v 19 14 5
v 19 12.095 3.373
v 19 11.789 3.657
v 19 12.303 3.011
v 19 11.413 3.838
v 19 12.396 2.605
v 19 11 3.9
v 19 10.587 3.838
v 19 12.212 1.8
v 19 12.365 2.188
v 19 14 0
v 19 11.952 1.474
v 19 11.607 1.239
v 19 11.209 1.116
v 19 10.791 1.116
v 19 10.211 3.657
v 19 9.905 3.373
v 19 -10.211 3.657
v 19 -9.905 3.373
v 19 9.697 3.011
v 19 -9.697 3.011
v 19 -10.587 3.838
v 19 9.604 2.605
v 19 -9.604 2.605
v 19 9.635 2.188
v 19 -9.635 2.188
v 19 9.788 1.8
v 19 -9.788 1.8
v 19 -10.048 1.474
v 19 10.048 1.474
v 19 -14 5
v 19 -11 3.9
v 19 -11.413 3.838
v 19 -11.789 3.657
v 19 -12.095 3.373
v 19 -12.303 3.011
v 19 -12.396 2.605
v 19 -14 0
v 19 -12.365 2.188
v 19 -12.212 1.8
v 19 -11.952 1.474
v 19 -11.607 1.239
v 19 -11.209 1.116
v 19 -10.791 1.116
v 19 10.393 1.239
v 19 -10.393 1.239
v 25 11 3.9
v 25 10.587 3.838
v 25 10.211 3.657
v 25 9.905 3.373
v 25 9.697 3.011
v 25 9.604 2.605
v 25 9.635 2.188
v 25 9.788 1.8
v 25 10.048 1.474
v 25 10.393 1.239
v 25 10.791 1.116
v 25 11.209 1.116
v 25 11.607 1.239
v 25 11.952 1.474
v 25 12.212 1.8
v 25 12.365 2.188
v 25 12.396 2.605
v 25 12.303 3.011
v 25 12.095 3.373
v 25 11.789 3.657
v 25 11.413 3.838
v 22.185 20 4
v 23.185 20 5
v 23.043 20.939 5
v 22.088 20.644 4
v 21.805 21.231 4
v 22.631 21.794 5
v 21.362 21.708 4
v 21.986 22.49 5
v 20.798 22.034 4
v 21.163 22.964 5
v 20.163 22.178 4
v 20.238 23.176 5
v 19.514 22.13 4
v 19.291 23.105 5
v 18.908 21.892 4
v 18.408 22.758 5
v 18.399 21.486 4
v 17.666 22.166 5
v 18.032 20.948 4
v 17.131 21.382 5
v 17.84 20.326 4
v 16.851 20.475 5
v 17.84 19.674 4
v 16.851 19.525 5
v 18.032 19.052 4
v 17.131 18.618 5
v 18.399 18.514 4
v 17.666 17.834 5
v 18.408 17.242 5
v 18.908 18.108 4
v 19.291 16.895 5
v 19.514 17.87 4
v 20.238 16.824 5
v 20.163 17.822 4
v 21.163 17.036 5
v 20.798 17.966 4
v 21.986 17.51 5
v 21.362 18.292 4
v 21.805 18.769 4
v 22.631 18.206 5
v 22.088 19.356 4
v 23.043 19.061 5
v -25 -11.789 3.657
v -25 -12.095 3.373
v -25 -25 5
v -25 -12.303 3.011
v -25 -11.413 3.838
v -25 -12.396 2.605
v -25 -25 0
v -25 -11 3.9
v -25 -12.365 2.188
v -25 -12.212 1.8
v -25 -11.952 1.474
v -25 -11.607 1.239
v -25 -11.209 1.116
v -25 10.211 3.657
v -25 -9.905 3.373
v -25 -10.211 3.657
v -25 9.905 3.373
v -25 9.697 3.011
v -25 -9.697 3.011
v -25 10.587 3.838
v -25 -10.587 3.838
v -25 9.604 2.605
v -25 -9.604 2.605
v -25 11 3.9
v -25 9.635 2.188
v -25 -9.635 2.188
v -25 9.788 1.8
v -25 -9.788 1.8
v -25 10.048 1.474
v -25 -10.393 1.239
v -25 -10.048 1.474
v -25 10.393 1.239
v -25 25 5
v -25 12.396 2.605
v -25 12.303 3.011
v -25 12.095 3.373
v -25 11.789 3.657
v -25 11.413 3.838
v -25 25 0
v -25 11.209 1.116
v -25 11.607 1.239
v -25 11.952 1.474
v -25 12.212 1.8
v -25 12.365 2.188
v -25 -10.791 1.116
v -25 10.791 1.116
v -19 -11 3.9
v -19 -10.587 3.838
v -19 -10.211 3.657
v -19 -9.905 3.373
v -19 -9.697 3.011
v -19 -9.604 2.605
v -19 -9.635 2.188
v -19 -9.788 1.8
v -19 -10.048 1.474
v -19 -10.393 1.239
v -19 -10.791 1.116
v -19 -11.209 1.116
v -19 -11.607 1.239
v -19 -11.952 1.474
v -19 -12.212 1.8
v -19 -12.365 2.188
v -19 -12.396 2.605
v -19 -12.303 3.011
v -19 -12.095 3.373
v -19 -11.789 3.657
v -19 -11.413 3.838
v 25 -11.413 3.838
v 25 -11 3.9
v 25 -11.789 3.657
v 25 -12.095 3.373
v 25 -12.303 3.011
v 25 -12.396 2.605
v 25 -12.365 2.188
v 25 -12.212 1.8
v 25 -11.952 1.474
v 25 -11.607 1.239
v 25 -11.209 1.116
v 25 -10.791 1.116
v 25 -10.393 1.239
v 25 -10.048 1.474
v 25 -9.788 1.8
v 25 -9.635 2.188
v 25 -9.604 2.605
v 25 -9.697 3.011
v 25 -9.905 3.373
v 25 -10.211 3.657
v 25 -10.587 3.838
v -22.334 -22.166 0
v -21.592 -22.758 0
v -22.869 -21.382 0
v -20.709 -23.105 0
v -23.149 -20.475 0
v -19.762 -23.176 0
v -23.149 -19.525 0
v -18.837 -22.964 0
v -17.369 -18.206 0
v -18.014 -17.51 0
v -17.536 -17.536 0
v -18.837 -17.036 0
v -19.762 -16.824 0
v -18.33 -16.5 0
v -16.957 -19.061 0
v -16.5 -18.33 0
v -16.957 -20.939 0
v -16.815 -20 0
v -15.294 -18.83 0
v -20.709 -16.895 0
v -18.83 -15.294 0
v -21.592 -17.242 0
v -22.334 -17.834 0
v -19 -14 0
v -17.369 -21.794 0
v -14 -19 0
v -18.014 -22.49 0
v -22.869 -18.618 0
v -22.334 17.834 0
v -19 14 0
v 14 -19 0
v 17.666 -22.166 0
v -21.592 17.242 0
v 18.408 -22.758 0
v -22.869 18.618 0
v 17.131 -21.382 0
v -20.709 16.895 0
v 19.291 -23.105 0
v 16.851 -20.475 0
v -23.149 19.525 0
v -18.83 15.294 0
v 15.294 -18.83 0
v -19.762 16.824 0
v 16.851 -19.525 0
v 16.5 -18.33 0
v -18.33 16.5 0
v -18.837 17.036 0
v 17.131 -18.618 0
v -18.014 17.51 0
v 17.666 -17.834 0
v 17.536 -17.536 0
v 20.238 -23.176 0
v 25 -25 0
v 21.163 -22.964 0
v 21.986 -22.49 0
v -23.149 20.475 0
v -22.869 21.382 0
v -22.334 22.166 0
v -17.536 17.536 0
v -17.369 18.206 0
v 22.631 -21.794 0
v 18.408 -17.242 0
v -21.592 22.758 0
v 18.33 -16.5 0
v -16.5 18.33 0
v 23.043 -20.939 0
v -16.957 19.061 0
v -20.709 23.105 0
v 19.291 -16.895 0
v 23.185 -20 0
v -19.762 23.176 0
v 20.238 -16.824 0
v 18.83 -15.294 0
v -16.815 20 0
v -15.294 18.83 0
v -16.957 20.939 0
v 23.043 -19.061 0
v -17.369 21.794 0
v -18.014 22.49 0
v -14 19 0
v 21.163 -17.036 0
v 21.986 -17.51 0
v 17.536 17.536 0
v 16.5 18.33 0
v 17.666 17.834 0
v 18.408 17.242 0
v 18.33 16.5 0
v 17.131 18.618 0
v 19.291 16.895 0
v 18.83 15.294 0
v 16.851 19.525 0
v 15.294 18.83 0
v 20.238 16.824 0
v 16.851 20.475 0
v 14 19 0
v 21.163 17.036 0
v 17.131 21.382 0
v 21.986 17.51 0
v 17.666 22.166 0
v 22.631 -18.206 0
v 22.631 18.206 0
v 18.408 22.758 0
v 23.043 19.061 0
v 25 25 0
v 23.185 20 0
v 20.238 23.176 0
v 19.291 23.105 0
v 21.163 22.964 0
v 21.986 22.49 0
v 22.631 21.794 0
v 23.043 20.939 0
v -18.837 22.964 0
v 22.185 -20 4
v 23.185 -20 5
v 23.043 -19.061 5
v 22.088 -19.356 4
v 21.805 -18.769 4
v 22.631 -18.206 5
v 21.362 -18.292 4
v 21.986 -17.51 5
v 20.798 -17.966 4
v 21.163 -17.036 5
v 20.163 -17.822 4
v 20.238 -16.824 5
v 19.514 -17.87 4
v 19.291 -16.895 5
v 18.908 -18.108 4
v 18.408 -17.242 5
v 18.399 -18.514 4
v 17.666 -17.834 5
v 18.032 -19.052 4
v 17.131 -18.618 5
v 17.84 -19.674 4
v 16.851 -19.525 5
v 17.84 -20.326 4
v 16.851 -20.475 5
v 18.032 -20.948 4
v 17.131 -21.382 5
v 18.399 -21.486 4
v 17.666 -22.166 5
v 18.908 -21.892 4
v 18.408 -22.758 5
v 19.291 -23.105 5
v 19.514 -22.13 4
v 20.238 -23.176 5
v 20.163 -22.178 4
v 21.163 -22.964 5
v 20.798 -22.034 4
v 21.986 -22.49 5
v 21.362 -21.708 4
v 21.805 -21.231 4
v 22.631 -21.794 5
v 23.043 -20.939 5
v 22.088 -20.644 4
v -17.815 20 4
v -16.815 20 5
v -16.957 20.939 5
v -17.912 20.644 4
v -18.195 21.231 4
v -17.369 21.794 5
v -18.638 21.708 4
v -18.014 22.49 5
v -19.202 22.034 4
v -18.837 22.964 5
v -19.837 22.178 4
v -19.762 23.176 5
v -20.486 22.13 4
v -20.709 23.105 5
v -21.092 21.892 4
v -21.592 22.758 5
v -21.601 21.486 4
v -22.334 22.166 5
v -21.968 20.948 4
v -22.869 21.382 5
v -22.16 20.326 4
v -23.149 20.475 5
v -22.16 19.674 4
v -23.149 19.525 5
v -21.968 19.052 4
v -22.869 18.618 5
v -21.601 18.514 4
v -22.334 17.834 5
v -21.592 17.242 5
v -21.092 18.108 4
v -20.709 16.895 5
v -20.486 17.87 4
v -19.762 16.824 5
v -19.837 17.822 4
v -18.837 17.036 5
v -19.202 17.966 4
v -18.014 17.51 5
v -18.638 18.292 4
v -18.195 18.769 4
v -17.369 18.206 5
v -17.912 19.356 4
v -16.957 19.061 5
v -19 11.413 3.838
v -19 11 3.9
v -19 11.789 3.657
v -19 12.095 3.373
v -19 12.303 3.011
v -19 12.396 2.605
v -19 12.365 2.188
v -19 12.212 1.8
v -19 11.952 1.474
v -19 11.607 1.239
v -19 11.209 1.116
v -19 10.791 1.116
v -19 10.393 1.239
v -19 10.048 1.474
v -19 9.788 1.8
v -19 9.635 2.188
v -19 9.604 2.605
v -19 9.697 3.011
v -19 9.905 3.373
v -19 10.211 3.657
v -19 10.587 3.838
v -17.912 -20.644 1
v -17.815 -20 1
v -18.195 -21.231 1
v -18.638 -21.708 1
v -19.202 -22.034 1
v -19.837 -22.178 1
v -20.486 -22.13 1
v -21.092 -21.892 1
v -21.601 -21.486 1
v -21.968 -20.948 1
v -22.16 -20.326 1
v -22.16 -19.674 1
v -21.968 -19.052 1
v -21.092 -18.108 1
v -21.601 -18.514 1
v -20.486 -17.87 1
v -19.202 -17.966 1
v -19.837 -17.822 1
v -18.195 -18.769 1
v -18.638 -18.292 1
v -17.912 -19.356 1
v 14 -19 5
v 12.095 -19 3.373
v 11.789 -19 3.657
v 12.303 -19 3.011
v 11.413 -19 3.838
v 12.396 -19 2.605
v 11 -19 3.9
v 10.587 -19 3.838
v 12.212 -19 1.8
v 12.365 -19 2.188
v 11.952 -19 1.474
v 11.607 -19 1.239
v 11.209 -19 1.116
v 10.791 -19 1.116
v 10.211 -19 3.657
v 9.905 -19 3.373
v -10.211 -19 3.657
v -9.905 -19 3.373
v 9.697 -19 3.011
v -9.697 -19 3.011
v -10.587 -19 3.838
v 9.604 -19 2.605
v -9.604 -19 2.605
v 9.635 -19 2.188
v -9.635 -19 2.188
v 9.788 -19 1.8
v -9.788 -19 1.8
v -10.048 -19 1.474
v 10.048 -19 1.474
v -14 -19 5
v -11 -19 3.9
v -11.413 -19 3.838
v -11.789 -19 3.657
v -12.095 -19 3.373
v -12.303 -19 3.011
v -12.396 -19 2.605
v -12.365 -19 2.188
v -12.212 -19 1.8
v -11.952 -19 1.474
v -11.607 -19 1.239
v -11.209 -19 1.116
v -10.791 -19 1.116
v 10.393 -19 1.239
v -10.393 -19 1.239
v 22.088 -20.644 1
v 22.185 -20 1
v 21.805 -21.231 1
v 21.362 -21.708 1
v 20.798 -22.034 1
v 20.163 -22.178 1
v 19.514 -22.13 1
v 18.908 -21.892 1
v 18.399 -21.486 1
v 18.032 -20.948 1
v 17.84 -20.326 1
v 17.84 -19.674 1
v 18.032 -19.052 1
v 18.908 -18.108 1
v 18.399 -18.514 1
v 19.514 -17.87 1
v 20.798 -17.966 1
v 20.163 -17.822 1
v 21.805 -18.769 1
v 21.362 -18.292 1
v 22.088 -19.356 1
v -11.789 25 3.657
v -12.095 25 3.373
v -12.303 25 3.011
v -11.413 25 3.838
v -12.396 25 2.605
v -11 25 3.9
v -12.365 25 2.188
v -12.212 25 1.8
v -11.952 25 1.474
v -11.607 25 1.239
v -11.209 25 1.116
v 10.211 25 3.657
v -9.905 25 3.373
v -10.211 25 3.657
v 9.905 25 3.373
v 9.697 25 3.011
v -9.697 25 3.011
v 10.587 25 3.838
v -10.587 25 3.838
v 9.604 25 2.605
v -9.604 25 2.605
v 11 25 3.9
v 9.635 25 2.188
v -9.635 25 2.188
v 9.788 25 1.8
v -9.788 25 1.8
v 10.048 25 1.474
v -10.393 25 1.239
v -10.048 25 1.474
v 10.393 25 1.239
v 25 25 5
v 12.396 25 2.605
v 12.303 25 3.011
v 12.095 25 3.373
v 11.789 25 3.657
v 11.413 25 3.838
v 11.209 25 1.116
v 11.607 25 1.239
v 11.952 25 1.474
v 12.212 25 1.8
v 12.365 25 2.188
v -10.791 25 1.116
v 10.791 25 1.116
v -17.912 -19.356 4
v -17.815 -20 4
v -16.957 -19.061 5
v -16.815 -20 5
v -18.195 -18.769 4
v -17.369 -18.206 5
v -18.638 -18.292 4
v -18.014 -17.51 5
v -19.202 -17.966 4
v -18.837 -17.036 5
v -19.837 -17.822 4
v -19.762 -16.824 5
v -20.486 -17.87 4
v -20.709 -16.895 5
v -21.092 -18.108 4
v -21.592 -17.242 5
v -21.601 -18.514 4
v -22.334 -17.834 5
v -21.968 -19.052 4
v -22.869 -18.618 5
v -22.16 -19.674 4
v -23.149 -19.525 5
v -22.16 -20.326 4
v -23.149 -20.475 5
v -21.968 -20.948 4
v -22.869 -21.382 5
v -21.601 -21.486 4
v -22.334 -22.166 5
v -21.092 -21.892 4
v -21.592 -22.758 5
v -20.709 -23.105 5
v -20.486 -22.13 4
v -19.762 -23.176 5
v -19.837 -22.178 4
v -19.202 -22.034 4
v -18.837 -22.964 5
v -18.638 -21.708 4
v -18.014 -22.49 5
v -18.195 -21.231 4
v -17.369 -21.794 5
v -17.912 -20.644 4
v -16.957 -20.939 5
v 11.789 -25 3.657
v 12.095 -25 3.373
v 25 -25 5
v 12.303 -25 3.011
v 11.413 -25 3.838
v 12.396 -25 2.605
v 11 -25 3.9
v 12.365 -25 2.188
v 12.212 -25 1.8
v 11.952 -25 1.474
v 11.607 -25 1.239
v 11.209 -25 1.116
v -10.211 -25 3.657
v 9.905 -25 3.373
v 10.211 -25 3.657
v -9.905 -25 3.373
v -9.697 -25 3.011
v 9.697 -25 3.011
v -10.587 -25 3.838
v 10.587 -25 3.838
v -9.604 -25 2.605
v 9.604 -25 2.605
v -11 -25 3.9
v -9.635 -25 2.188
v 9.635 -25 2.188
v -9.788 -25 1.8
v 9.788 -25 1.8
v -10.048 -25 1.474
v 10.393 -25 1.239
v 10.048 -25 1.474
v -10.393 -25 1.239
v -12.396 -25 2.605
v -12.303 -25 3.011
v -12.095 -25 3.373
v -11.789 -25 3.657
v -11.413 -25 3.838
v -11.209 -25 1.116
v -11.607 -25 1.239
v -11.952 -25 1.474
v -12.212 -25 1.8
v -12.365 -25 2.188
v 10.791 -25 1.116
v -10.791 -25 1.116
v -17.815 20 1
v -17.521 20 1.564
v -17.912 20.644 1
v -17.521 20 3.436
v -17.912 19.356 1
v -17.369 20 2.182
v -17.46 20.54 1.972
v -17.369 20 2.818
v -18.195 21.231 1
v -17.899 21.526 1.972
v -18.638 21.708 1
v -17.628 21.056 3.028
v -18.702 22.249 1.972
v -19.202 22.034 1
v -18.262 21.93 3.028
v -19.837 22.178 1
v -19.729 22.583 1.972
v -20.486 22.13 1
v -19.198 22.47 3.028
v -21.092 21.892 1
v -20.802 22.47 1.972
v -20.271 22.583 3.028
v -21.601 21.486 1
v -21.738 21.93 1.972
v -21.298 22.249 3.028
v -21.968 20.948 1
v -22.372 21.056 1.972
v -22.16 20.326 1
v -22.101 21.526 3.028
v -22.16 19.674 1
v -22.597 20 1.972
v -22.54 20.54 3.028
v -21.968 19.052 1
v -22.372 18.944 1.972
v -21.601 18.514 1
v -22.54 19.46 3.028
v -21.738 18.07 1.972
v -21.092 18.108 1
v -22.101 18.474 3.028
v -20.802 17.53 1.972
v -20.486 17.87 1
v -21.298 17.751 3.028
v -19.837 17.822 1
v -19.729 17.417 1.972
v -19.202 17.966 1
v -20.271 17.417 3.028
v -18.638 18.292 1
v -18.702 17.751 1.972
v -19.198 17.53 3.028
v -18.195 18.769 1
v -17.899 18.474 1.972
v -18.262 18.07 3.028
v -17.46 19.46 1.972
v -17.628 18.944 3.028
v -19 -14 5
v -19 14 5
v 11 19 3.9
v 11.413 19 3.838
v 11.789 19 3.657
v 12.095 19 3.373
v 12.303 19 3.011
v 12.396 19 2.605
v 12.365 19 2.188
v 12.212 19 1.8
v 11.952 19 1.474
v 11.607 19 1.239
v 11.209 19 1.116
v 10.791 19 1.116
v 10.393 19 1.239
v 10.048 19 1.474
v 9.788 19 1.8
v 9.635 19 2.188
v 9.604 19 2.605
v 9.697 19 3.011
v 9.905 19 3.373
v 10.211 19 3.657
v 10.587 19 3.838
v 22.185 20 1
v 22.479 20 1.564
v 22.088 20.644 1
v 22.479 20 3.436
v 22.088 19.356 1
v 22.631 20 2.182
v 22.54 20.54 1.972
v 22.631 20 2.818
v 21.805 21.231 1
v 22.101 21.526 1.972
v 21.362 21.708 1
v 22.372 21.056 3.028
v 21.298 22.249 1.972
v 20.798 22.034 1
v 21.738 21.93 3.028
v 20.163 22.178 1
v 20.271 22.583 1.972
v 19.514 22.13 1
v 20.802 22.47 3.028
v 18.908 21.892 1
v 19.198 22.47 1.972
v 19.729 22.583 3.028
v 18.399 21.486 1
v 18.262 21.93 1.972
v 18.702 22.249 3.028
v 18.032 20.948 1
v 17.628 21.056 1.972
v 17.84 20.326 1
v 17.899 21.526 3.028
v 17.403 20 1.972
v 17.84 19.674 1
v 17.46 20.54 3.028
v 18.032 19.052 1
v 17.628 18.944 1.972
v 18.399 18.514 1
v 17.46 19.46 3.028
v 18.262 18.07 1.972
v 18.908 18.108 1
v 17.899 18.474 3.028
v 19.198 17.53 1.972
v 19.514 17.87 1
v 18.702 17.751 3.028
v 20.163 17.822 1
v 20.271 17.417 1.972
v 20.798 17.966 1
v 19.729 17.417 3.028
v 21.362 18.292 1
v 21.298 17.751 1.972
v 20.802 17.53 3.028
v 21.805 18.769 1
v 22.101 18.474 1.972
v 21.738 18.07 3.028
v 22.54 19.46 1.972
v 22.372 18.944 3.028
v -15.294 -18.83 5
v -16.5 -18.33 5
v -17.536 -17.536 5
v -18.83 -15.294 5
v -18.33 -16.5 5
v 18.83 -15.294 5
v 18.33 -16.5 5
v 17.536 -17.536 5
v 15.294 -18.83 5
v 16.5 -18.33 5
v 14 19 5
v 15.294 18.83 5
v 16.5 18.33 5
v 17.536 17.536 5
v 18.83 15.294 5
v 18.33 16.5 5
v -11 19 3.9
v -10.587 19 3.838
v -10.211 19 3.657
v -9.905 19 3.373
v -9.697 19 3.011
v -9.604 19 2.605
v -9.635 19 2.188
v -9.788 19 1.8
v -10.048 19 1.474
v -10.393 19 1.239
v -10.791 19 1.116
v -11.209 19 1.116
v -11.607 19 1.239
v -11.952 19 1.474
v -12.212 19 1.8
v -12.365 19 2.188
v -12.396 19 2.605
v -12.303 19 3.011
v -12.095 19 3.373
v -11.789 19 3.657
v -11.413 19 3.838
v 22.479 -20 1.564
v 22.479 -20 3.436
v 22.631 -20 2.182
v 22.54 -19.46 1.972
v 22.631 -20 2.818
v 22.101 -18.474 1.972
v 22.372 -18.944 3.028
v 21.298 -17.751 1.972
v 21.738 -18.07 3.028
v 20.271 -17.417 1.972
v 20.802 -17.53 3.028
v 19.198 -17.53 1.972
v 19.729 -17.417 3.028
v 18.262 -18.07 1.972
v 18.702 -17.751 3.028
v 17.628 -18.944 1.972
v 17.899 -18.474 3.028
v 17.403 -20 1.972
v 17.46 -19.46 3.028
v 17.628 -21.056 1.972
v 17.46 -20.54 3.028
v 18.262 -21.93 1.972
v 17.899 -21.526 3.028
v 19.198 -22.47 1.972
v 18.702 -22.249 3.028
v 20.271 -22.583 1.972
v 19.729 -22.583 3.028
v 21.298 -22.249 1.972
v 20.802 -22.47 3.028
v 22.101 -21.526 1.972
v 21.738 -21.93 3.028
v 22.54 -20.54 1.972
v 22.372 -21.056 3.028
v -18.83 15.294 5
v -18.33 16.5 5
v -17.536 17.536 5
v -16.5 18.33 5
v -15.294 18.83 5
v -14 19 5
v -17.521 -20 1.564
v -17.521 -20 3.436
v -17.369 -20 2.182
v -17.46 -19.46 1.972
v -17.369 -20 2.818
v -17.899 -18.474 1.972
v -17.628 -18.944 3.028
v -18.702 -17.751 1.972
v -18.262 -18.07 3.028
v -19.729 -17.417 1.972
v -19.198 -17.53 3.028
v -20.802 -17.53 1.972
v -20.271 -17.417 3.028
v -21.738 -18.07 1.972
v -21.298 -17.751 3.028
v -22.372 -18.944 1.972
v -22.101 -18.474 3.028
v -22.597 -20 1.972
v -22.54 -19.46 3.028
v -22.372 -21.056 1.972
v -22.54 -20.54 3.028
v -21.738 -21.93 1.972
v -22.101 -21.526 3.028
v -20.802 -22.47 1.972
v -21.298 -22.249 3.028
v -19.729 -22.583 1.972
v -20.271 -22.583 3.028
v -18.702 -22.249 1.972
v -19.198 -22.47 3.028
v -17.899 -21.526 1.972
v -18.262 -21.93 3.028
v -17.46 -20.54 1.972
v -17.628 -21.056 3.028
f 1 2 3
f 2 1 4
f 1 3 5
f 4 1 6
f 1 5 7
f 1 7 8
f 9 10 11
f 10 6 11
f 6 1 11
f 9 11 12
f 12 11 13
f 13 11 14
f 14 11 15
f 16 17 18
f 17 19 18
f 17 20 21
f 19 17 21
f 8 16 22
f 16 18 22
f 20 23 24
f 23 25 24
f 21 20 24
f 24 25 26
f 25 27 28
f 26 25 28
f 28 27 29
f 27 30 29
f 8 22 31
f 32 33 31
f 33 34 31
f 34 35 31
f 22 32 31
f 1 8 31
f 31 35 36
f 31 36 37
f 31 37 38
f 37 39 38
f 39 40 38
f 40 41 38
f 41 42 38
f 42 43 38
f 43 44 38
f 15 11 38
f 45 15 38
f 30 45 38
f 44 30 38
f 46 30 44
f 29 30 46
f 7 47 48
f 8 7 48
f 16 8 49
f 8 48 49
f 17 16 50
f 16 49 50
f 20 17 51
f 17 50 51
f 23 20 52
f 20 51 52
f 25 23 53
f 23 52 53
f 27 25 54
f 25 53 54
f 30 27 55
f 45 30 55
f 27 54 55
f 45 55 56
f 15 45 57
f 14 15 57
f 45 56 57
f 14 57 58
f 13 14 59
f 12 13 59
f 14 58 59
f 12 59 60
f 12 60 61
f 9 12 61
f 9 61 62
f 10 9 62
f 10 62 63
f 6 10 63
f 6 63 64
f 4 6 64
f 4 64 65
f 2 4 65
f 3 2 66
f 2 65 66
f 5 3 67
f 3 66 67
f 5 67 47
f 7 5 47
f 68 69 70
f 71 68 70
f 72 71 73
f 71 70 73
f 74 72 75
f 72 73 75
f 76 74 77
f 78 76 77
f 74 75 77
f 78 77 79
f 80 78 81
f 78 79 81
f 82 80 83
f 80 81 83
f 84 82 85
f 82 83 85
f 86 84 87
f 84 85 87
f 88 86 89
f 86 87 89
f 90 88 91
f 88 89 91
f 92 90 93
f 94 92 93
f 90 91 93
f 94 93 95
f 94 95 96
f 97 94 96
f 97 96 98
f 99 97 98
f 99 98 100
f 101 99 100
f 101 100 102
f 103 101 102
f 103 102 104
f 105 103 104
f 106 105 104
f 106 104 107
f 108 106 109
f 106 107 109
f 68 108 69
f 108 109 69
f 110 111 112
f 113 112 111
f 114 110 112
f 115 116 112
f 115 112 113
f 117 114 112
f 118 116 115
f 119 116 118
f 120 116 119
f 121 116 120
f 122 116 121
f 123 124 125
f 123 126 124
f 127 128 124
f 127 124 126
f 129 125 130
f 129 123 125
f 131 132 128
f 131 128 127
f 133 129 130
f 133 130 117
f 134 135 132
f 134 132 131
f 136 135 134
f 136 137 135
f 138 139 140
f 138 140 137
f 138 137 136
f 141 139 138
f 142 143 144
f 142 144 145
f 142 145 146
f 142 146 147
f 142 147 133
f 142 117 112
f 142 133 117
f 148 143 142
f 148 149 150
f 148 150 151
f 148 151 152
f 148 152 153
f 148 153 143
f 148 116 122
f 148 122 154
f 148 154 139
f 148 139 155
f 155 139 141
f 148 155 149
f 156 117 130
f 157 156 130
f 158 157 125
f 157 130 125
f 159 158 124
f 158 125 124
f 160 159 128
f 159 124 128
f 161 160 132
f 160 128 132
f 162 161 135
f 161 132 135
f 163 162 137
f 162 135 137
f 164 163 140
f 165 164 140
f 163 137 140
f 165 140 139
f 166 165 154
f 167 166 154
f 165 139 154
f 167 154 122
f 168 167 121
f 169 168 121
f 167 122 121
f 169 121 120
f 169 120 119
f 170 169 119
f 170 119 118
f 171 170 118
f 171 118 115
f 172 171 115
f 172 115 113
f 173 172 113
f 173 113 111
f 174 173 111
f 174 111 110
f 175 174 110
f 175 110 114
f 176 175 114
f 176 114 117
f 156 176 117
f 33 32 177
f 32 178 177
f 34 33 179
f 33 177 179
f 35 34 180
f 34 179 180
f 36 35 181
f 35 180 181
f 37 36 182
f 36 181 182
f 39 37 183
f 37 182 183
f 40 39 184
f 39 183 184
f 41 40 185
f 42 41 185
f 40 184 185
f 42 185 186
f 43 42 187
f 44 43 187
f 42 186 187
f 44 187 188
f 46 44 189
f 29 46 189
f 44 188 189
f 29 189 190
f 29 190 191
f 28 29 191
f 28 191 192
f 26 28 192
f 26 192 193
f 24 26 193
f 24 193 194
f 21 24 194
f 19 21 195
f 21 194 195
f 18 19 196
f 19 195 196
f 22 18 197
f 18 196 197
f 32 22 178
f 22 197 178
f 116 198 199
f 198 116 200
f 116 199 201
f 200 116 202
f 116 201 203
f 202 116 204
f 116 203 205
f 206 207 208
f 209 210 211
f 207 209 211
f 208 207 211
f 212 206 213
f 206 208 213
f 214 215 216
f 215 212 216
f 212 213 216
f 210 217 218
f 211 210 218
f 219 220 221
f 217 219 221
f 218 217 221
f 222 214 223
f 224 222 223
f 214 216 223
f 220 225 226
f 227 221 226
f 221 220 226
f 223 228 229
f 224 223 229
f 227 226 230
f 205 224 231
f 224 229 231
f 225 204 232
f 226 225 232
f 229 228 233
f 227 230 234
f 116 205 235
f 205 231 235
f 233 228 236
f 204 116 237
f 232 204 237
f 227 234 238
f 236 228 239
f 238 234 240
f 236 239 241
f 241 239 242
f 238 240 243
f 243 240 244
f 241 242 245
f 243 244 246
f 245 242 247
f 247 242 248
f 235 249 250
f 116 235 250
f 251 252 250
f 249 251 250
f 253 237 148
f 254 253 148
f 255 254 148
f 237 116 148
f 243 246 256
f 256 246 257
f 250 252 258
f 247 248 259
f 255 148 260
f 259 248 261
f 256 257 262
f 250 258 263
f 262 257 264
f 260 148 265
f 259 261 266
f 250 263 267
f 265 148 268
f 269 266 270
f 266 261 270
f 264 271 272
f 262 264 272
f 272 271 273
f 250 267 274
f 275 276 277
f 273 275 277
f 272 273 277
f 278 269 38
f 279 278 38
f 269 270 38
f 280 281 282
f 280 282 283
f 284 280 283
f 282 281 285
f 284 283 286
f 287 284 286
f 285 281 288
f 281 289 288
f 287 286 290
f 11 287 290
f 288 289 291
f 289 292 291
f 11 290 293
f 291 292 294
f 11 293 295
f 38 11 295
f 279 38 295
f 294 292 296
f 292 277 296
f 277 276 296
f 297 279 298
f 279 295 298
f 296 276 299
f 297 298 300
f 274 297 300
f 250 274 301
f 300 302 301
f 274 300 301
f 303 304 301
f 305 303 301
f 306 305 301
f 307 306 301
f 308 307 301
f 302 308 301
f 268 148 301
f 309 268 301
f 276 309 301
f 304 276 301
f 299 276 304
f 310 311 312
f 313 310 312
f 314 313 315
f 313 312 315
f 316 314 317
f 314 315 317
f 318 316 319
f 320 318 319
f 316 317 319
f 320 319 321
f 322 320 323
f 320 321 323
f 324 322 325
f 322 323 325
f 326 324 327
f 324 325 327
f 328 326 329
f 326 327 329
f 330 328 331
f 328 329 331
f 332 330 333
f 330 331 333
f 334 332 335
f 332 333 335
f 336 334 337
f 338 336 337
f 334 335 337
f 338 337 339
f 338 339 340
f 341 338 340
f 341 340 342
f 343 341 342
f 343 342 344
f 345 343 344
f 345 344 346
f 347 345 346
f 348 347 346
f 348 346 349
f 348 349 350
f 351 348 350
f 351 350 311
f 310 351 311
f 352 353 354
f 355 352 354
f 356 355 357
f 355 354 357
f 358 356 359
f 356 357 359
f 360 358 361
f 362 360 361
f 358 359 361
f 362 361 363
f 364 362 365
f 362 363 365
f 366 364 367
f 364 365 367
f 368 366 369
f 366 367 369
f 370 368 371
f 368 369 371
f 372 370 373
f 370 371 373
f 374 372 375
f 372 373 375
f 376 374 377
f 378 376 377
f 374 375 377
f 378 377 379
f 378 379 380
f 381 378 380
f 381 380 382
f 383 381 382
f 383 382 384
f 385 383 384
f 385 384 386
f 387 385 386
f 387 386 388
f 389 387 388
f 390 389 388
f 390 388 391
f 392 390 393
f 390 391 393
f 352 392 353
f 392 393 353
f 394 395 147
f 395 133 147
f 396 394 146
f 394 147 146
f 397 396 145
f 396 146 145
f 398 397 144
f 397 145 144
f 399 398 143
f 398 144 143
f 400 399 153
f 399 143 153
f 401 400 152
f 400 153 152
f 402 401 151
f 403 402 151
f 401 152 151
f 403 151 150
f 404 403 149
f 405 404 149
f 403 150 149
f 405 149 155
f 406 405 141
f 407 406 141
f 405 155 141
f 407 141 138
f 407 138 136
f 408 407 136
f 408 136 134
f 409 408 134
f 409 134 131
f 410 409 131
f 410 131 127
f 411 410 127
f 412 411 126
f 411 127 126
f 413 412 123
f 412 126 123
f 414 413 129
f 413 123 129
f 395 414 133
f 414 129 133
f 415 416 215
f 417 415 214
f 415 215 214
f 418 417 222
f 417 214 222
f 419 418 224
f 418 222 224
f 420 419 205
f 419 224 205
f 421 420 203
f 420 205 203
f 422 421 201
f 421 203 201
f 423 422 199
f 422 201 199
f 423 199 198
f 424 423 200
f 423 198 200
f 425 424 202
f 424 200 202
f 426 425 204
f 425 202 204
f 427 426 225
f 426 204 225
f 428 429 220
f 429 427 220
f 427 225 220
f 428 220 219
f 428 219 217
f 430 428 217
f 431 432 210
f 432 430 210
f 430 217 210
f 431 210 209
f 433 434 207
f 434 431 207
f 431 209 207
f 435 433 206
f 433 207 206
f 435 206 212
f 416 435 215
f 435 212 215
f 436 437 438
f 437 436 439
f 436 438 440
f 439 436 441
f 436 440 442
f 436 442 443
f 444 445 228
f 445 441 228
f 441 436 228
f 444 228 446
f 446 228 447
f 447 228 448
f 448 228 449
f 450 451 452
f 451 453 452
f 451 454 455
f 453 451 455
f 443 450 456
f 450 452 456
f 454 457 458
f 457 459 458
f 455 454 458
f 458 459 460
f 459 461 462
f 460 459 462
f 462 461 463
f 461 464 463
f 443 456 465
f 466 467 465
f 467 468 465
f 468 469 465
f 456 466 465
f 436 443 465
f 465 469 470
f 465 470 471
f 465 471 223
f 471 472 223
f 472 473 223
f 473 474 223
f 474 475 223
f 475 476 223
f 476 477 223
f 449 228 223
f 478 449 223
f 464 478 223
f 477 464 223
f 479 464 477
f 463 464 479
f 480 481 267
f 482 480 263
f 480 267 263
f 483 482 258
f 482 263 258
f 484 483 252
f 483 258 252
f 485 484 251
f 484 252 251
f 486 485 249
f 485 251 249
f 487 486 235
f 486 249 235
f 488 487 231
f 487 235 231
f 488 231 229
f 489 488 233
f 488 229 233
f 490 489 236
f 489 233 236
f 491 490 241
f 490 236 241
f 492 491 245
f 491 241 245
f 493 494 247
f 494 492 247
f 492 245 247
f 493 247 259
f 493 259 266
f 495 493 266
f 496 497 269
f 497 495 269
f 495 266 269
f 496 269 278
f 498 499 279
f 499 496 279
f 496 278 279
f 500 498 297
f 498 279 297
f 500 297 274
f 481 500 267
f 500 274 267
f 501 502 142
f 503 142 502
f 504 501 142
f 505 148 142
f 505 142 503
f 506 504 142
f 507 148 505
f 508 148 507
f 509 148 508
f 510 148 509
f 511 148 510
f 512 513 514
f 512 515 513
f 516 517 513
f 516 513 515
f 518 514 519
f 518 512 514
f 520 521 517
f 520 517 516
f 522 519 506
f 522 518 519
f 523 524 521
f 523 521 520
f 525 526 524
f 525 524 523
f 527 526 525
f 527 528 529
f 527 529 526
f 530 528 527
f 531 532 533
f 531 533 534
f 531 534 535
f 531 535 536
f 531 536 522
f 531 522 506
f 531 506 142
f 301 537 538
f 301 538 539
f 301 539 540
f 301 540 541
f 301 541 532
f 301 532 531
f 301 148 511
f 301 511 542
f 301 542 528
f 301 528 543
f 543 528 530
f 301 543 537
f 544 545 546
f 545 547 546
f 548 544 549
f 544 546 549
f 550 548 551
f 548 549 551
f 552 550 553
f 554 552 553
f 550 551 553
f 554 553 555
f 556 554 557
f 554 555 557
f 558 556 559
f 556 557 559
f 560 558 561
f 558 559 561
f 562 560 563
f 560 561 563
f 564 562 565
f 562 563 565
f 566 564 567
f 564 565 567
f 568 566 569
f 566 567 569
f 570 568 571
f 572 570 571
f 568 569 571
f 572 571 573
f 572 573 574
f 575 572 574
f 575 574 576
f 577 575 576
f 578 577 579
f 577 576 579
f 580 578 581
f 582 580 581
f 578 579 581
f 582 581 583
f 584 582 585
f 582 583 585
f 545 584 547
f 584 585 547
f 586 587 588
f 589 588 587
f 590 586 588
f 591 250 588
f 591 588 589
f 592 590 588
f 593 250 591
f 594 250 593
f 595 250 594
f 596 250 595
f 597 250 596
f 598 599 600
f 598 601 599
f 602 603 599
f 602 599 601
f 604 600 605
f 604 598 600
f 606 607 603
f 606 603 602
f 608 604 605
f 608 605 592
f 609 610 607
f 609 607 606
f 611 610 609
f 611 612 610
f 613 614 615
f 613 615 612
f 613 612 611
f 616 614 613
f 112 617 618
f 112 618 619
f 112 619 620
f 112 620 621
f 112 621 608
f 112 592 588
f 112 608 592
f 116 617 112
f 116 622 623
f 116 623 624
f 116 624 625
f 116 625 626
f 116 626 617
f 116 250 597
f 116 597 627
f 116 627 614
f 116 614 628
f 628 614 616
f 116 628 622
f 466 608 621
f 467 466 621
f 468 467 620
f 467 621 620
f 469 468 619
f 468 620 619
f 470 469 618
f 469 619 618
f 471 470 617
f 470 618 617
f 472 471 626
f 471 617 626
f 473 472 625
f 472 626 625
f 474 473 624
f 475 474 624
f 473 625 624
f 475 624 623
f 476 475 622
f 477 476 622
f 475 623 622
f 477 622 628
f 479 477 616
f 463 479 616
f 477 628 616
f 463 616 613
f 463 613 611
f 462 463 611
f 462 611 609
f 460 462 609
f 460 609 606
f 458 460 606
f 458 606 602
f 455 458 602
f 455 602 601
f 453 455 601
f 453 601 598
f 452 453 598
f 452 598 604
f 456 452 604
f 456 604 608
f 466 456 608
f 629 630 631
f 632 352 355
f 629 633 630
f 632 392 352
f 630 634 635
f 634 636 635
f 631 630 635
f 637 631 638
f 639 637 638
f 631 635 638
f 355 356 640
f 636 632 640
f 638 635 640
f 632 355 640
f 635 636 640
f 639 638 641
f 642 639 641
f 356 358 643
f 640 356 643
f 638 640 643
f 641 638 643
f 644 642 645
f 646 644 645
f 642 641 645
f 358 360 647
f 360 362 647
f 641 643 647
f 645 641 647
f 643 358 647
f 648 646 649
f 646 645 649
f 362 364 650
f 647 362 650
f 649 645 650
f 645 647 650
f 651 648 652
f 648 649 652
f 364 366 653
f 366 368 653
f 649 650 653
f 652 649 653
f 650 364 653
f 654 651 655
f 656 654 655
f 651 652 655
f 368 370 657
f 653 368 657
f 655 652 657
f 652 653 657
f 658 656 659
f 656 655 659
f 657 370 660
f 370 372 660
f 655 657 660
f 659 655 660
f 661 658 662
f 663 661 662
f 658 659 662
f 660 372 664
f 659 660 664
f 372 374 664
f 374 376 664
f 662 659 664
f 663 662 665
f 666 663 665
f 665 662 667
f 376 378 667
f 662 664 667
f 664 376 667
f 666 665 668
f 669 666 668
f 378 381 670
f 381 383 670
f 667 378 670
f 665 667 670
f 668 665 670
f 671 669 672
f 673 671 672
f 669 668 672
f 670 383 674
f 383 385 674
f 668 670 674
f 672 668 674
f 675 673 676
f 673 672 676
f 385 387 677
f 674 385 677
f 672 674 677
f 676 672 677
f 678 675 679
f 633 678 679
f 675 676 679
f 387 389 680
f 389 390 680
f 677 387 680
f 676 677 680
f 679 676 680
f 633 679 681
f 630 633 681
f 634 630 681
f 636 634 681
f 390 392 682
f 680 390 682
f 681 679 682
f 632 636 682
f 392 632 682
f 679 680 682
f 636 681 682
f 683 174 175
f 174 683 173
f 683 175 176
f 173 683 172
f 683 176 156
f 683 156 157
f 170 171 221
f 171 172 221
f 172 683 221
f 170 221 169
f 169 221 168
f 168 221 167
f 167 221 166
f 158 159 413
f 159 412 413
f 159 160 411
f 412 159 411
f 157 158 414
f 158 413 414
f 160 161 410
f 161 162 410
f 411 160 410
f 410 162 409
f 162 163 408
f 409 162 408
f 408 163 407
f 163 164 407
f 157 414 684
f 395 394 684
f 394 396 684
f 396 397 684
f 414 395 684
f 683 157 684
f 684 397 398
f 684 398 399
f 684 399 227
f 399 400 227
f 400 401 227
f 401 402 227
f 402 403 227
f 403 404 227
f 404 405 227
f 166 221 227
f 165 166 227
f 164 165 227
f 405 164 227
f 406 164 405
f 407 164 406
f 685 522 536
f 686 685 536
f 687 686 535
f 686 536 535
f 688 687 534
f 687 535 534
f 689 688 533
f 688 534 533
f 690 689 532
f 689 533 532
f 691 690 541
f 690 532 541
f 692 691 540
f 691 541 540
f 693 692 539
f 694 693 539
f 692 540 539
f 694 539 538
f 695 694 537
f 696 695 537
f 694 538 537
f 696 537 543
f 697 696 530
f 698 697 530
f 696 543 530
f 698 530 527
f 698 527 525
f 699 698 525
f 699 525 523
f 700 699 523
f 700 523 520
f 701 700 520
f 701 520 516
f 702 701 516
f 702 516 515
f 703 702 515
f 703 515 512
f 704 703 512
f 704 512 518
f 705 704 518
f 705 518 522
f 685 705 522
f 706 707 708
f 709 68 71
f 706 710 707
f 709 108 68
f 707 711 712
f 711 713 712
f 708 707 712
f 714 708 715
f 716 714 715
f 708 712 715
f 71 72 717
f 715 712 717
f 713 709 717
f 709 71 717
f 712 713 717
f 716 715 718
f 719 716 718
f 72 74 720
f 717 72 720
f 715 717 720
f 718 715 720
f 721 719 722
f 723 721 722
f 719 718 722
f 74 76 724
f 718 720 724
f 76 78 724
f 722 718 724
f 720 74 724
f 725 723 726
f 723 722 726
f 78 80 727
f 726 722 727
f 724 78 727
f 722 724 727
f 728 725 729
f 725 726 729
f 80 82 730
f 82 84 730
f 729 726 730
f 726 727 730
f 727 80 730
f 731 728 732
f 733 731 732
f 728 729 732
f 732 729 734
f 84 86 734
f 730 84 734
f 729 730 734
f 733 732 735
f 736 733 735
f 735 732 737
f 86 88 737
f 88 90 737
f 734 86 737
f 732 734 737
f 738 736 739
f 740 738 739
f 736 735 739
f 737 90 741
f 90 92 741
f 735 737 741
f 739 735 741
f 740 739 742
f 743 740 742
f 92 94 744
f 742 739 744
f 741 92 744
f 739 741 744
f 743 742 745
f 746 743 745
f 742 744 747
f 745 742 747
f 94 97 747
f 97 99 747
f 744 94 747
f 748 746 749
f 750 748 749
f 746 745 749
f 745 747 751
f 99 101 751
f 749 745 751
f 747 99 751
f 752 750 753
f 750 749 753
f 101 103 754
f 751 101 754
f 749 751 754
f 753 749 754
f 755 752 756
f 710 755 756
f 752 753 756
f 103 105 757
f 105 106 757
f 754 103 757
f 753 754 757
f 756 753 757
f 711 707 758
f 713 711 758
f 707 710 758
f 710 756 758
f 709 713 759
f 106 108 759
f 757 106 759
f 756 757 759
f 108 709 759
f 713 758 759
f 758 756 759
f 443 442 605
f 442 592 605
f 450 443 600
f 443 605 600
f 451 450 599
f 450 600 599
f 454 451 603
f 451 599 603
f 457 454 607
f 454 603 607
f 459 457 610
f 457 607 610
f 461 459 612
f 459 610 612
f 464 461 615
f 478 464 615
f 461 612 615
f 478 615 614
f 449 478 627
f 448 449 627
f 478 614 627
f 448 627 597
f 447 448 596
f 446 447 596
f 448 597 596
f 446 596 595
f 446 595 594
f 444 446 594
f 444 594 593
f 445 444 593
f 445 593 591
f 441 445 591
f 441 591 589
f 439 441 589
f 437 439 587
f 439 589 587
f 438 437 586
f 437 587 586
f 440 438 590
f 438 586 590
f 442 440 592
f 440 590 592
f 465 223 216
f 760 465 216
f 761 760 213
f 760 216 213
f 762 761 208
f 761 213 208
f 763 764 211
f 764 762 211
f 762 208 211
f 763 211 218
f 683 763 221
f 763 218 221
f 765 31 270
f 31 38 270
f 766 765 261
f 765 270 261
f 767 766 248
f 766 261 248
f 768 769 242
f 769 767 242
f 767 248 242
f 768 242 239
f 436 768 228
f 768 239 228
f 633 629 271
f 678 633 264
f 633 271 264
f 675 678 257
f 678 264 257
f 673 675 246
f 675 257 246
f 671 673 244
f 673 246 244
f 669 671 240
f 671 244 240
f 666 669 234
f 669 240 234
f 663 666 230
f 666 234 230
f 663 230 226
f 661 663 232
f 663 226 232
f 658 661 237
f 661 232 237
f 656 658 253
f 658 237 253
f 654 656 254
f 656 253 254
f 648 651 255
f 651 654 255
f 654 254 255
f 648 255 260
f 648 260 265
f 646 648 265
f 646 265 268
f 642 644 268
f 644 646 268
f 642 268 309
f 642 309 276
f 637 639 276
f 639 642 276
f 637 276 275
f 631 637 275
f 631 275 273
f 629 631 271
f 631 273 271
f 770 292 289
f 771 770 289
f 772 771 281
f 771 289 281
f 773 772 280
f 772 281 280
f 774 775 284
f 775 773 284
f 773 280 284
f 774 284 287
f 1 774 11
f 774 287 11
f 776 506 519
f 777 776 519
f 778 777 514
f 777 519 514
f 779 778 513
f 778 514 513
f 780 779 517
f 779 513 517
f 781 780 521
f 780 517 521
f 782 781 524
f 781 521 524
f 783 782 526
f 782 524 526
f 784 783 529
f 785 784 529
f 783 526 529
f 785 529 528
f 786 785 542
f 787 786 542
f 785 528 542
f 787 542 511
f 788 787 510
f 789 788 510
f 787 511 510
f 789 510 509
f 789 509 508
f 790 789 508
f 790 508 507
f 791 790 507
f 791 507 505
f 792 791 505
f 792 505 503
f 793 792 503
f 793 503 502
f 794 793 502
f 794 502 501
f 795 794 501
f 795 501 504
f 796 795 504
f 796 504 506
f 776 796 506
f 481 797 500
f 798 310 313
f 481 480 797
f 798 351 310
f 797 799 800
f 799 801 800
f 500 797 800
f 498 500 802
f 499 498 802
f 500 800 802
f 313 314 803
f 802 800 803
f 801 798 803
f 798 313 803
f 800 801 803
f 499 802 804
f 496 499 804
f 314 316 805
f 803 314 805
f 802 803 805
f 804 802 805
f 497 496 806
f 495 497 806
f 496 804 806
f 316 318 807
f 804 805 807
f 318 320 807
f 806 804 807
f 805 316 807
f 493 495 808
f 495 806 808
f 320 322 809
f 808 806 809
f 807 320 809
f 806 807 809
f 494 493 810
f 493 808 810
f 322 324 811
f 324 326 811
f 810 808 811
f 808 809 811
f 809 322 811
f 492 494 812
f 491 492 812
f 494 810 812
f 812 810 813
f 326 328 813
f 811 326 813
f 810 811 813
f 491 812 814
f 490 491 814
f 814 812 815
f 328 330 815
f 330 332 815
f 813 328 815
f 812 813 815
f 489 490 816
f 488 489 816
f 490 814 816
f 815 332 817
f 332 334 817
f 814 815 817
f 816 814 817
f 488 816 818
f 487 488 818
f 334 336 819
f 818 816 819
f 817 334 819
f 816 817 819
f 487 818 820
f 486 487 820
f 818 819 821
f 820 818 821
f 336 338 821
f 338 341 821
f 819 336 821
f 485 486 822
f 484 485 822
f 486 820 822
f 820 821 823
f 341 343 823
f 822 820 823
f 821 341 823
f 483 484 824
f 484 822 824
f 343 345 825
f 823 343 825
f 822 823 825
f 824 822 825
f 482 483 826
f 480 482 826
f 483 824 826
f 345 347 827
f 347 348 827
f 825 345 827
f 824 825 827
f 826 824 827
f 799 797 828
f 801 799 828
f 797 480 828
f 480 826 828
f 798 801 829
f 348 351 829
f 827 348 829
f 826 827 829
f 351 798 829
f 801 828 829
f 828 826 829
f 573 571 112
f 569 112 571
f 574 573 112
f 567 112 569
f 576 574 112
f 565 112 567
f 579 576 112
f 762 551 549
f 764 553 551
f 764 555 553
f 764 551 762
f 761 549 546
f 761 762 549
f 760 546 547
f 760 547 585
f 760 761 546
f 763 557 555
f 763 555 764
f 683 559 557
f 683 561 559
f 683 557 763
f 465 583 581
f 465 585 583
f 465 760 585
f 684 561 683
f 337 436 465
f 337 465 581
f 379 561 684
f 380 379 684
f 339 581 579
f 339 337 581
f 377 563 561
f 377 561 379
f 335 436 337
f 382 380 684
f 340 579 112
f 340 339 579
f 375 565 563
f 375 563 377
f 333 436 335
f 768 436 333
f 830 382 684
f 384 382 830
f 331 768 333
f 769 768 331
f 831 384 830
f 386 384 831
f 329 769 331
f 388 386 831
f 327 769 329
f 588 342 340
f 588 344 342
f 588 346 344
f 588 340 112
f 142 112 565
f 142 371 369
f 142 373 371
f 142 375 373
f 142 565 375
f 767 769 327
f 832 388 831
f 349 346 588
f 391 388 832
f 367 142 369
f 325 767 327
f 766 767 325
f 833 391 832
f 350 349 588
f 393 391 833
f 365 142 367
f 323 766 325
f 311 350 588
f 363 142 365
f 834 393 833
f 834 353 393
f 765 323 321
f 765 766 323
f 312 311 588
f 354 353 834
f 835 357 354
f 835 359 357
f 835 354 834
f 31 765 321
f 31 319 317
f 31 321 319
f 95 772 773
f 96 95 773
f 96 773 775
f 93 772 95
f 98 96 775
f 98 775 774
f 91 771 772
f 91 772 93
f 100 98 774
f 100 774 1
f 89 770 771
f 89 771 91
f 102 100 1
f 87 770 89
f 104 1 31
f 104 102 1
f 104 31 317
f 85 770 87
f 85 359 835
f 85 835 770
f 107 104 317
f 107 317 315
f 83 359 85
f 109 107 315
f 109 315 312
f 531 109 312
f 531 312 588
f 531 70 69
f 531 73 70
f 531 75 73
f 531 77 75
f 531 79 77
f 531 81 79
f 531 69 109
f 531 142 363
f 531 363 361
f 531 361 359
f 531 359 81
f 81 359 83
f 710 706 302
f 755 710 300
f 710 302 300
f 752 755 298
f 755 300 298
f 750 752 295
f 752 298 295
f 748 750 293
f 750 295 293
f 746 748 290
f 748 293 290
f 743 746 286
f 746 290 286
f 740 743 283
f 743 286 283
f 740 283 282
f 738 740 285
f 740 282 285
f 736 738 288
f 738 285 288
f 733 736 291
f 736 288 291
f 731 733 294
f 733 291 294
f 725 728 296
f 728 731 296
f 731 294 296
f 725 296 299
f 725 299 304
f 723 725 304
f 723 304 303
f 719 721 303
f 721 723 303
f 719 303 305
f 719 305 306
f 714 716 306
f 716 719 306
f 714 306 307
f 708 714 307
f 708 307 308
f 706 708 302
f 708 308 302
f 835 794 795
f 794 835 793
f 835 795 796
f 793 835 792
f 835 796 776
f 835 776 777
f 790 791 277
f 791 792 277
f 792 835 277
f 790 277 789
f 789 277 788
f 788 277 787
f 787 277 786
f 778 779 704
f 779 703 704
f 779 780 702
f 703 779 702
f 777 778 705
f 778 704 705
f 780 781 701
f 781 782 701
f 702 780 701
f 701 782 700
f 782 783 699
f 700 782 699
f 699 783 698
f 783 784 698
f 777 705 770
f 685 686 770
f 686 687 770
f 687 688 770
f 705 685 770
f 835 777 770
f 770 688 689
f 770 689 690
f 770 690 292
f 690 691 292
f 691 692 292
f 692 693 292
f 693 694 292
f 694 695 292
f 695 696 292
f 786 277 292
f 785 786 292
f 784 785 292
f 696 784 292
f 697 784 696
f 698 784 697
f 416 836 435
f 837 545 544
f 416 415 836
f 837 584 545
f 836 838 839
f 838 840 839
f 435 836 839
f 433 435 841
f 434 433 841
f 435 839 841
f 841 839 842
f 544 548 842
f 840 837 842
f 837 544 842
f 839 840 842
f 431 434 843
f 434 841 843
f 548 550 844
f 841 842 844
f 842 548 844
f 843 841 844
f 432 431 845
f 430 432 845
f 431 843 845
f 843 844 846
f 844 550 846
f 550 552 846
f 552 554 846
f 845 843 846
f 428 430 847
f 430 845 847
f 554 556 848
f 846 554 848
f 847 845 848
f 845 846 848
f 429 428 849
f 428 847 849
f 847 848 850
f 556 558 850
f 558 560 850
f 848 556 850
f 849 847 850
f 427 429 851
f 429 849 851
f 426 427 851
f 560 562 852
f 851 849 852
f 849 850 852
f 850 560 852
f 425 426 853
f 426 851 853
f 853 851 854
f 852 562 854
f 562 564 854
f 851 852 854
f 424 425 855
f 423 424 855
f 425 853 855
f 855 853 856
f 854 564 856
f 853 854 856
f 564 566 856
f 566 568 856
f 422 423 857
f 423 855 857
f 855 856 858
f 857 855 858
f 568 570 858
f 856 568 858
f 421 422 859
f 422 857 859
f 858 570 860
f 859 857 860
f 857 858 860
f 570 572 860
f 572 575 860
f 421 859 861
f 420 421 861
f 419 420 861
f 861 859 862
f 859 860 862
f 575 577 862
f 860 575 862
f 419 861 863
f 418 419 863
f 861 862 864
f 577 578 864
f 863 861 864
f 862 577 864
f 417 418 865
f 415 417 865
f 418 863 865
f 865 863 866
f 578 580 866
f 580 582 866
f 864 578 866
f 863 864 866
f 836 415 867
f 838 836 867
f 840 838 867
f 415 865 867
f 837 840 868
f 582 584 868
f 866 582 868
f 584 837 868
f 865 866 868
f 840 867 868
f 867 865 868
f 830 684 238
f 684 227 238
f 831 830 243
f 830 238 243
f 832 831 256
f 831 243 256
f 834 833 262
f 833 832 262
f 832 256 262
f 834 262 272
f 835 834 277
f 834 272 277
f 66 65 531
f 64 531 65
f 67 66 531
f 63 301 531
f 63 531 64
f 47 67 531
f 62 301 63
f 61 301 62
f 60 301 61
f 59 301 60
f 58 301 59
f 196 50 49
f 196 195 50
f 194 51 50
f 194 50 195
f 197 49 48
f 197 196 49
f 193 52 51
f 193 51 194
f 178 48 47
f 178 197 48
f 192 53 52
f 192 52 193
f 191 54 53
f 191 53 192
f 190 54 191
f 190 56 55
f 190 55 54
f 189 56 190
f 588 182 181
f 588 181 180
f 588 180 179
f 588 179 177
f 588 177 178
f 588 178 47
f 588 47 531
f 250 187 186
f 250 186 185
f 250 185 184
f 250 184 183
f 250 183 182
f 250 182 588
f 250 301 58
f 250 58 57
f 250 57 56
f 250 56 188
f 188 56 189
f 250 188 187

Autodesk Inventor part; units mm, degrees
ref_plane "YZ Plane" through (0, 0, 0) normal (1, 0, 0) x (0, 1, 0)
ref_plane "XZ Plane" through (0, 0, 0) normal (0, 1, 0) x (-1, 0, 0)
sketch "Skizze1" plane through (0, 0, 0) normal (0, 0, 1) x (1, 0, 0)
  line L0 (-25, 25) -> (25, 25)
  line L1 (25, 25) -> (25, -25)
  line L2 (25, -25) -> (-25, -25)
  line L3 (-25, -25) -> (-25, 25)
  line L4 (-25, 25) -> (25, -25) construction
  line L5 (25, 25) -> (-25, -25) construction
  line L6 (20, 20) -> (23, 20) construction
  line L7 (-20, -20) -> (20, -20) construction
  line L8 (20, -20) -> (20, 20) construction
  line L9 (20, 20) -> (-20, 20) construction
  line L10 (-20, 20) -> (-20, -20) construction
  line L11 (-20, -20) -> (20, 20) construction
  line L12 (20, -20) -> (-20, 20) construction
  line L13 (-14, 19) -> (14, 19)
  line L14 (19, 14) -> (19, -14)
  line L15 (14, -19) -> (-14, -19)
  line L16 (-19, -14) -> (-19, 14)
  line L17 (-19, 19) -> (19, -19) construction
  line L18 (19, 19) -> (-19, -19) construction
  arc A0 (14, -19) -> (19, -14) centre (14, -14) ccw
  arc A1 (19, 14) -> (14, 19) centre (14, 14) ccw
  arc A2 (-14, 19) -> (-19, 14) centre (-14, 14) ccw
  arc A3 (-19, -14) -> (-14, -19) centre (-14, -14) ccw
  point P0 (0, 0)
  point P1 (0, 0)
  dimension "d2" = 50
  dimension "d3" = 50
  dimension "d273" = 40
  dimension "d274" = 40
  dimension "d275" = 38
  dimension "d276" = 38
  dimension "d277" = 5
extrude "Extrusion1" add sketch "Skizze1" along normal blind 5
ref_plane "Arbeitsebene1" through (-25, -20, 0) normal (0, -1, 0) x (1, 0, 0)
sketch "Skizze5" plane through (-25, -20, 0) normal (0, -1, 0) x (1, 0, 0)
  line L0 (50, 0) -> (0, 0) projected
  line L1 (0, 0) -> (0, 5) projected
  line L2 (5, -0.15) -> (5, 5.15)
  line L3 (5, 1) -> (7.1846, 1)
  line L4 (2.7, -1.6033) -> (2.7, 1.1838)
  line L5 (5, -1.6033) -> (5, -0.15)
  arc A0 (2.7, 3.8162) -> (4.1211, 0) centre (5, 2.5) ccw
  arc A1 (5, -0.15) -> (5, 5.15) centre (5, 2.5) ccw
  line L6 (7.1846, 1) -> (8.3346, -0.15)
  line L7 (8.3346, -0.15) -> (5, -0.15)
  line L8 (5, 2.5) -> (6.8859, 2.5)
  line L9 (7.1846, 4) -> (8.3346, 5.15)
  line L10 (8.3346, 5.15) -> (5, 5.15)
  point P0 (25, 0)
  point P1 (40, 8)
  point P2 (6.6949, -37.8745)
  dimension "d237" = 2.5
  dimension "d238" = 5
  dimension "d240" = 2.3
  dimension "d247" = 135
  dimension "d248" = 1.5
  dimension "d249" = 2.65
revolve "Umdrehung1" cut sketch "Skizze5" angle 360 about axis through (-20, -20, -0.15) along (0, 0, 1) contours L6 L7 A1 L0 | L0 A1 L6 | A1 L2 L0 | L0 L2 L3 A1 | L3 L2 A1 | A1 L10 L9
pattern_linear "Rechteckige Anordnung7" count 2 spacing 40 along (1, 0, 0) count 2 spacing 40 along (0, 1, 0) of "Umdrehung1"
sketch "Skizze16" plane through (0, 0, 0) normal (0, 0, -1) x (-1, 0, 0)
  line L0 (25, 25) -> (-25, 25) projected
  line L1 (-25, 25) -> (-25, -25) projected
  line L2 (-25, -25) -> (25, -25) projected
  line L3 (25, -25) -> (25, 25) projected
  circle A0 centre (0, 0) radius 25
  line L4 (-25, -25) -> (25, -25) projected
  line L5 (25, 25) -> (-25, 25) projected
  line L6 (25, 25) -> (25, -25) projected
  circle A1 centre (-20, 20) radius 3.1846 projected
  circle A2 centre (20, 20) radius 3.1846 projected
  circle A3 centre (20, -20) radius 3.1846 projected
  circle A4 centre (-20, -20) radius 3.1846 projected
  point P0 (0, -25)
  point P1 (-25, 0)
  point P2 (0, 25)
  point P3 (25, 0)
sketch "Skizze17" plane through (25, -15.5, 1) normal (-1, 0, 0) x (0, 0, 1)
  line L0 (-1, 40.5) -> (-1, -9.5) projected
  line L1 (-1, 40.5) -> (4, 40.5) projected
  line L2 (4, -9.5) -> (4, 40.5) projected
  line L3 (4, -9.5) -> (4, 40.5) projected
  line L4 (-1, -9.5) -> (4, -9.5) projected
  line L5 (-1, 40.5) -> (-1, -9.5) projected
  circle A0 centre (1.5, 26.5) radius 1.4
  circle A1 centre (1.5, 4.5) radius 1.4
  line L6 (-1, 40.5) -> (4, 40.5) projected
  line L7 (-1, -9.5) -> (4, -9.5) projected
  dimension "d241" = 2.8
  dimension "d242" = 2.8
  dimension "d243" = 14
  dimension "d1" = 14
  dimension "d253" = 2.5
  dimension "d254" = 2.5
extrude "Extrusion12" cut sketch "Skizze17" along normal blind 10 contours A0 | A1
sketch "Sketch24" plane through (0, 0, 0) normal (0, 0, -1) x (-1, 0, 0)
  circle A0 centre (20, -20) radius 3.1846 projected
  circle A1 centre (-20, -20) radius 3.1846 projected
  circle A2 centre (20, 20) radius 3.1846 projected
  circle A3 centre (-20, 20) radius 3.1846 projected
  line L0 (25, 25) -> (-25, 25) projected
  line L1 (-25, 25) -> (-25, -25) projected
  line L2 (-25, -25) -> (25, -25) projected
  line L3 (25, -25) -> (25, 25) projected
  circle A4 centre (0, 0) radius 12.0567
pattern_circular "Circular Pattern4" count 4 over 360 about axis through (0, 0, 0) along (0, 0, 1) of "Extrusion12"
equation "\"d2\" = d_part"
equation "\"d3\" = d_part"
equation "\"d_i\" = 40"
equation "\"d_o\" = 40"
equation "\"d_part\" = 50"
equation "\"d6\" = 0"
equation "\"d7\" = 0"
equation "\"d8\" = 0"
equation "\"d9\" = 0"
equation "\"d13\" = 0"
equation "\"d14\" = 0"
equation "\"d20\" = 0"
equation "\"d21\" = 0"
equation "\"d22\" = 0"
equation "\"d23\" = 0"
equation "\"d24\" = 0"
equation "\"d25\" = 3"
equation "\"d26\" = 0"
equation "\"d27\" = 0"
equation "\"d28\" = 0"
equation "\"d29\" = 0"
equation "\"d30\" = 0"
equation "\"d31\" = 0"
equation "\"d32\" = 0"
equation "\"d33\" = 0"
equation "\"d34\" = 0"
equation "\"d46\" = 0"
equation "\"d47\" = 0"
equation "\"d48\" = 0"
equation "\"d50\" = 0"
equation "\"d51\" = 0"
equation "\"d52\" = 0"
equation "\"d53\" = 0"
equation "\"d54\" = 0"
equation "\"d55\" = 0"
equation "\"d56\" = 0"
equation "\"d57\" = 0"
equation "\"d58\" = 0"
equation "\"d59\" = 0"
properties part number "10_Base_v2"
